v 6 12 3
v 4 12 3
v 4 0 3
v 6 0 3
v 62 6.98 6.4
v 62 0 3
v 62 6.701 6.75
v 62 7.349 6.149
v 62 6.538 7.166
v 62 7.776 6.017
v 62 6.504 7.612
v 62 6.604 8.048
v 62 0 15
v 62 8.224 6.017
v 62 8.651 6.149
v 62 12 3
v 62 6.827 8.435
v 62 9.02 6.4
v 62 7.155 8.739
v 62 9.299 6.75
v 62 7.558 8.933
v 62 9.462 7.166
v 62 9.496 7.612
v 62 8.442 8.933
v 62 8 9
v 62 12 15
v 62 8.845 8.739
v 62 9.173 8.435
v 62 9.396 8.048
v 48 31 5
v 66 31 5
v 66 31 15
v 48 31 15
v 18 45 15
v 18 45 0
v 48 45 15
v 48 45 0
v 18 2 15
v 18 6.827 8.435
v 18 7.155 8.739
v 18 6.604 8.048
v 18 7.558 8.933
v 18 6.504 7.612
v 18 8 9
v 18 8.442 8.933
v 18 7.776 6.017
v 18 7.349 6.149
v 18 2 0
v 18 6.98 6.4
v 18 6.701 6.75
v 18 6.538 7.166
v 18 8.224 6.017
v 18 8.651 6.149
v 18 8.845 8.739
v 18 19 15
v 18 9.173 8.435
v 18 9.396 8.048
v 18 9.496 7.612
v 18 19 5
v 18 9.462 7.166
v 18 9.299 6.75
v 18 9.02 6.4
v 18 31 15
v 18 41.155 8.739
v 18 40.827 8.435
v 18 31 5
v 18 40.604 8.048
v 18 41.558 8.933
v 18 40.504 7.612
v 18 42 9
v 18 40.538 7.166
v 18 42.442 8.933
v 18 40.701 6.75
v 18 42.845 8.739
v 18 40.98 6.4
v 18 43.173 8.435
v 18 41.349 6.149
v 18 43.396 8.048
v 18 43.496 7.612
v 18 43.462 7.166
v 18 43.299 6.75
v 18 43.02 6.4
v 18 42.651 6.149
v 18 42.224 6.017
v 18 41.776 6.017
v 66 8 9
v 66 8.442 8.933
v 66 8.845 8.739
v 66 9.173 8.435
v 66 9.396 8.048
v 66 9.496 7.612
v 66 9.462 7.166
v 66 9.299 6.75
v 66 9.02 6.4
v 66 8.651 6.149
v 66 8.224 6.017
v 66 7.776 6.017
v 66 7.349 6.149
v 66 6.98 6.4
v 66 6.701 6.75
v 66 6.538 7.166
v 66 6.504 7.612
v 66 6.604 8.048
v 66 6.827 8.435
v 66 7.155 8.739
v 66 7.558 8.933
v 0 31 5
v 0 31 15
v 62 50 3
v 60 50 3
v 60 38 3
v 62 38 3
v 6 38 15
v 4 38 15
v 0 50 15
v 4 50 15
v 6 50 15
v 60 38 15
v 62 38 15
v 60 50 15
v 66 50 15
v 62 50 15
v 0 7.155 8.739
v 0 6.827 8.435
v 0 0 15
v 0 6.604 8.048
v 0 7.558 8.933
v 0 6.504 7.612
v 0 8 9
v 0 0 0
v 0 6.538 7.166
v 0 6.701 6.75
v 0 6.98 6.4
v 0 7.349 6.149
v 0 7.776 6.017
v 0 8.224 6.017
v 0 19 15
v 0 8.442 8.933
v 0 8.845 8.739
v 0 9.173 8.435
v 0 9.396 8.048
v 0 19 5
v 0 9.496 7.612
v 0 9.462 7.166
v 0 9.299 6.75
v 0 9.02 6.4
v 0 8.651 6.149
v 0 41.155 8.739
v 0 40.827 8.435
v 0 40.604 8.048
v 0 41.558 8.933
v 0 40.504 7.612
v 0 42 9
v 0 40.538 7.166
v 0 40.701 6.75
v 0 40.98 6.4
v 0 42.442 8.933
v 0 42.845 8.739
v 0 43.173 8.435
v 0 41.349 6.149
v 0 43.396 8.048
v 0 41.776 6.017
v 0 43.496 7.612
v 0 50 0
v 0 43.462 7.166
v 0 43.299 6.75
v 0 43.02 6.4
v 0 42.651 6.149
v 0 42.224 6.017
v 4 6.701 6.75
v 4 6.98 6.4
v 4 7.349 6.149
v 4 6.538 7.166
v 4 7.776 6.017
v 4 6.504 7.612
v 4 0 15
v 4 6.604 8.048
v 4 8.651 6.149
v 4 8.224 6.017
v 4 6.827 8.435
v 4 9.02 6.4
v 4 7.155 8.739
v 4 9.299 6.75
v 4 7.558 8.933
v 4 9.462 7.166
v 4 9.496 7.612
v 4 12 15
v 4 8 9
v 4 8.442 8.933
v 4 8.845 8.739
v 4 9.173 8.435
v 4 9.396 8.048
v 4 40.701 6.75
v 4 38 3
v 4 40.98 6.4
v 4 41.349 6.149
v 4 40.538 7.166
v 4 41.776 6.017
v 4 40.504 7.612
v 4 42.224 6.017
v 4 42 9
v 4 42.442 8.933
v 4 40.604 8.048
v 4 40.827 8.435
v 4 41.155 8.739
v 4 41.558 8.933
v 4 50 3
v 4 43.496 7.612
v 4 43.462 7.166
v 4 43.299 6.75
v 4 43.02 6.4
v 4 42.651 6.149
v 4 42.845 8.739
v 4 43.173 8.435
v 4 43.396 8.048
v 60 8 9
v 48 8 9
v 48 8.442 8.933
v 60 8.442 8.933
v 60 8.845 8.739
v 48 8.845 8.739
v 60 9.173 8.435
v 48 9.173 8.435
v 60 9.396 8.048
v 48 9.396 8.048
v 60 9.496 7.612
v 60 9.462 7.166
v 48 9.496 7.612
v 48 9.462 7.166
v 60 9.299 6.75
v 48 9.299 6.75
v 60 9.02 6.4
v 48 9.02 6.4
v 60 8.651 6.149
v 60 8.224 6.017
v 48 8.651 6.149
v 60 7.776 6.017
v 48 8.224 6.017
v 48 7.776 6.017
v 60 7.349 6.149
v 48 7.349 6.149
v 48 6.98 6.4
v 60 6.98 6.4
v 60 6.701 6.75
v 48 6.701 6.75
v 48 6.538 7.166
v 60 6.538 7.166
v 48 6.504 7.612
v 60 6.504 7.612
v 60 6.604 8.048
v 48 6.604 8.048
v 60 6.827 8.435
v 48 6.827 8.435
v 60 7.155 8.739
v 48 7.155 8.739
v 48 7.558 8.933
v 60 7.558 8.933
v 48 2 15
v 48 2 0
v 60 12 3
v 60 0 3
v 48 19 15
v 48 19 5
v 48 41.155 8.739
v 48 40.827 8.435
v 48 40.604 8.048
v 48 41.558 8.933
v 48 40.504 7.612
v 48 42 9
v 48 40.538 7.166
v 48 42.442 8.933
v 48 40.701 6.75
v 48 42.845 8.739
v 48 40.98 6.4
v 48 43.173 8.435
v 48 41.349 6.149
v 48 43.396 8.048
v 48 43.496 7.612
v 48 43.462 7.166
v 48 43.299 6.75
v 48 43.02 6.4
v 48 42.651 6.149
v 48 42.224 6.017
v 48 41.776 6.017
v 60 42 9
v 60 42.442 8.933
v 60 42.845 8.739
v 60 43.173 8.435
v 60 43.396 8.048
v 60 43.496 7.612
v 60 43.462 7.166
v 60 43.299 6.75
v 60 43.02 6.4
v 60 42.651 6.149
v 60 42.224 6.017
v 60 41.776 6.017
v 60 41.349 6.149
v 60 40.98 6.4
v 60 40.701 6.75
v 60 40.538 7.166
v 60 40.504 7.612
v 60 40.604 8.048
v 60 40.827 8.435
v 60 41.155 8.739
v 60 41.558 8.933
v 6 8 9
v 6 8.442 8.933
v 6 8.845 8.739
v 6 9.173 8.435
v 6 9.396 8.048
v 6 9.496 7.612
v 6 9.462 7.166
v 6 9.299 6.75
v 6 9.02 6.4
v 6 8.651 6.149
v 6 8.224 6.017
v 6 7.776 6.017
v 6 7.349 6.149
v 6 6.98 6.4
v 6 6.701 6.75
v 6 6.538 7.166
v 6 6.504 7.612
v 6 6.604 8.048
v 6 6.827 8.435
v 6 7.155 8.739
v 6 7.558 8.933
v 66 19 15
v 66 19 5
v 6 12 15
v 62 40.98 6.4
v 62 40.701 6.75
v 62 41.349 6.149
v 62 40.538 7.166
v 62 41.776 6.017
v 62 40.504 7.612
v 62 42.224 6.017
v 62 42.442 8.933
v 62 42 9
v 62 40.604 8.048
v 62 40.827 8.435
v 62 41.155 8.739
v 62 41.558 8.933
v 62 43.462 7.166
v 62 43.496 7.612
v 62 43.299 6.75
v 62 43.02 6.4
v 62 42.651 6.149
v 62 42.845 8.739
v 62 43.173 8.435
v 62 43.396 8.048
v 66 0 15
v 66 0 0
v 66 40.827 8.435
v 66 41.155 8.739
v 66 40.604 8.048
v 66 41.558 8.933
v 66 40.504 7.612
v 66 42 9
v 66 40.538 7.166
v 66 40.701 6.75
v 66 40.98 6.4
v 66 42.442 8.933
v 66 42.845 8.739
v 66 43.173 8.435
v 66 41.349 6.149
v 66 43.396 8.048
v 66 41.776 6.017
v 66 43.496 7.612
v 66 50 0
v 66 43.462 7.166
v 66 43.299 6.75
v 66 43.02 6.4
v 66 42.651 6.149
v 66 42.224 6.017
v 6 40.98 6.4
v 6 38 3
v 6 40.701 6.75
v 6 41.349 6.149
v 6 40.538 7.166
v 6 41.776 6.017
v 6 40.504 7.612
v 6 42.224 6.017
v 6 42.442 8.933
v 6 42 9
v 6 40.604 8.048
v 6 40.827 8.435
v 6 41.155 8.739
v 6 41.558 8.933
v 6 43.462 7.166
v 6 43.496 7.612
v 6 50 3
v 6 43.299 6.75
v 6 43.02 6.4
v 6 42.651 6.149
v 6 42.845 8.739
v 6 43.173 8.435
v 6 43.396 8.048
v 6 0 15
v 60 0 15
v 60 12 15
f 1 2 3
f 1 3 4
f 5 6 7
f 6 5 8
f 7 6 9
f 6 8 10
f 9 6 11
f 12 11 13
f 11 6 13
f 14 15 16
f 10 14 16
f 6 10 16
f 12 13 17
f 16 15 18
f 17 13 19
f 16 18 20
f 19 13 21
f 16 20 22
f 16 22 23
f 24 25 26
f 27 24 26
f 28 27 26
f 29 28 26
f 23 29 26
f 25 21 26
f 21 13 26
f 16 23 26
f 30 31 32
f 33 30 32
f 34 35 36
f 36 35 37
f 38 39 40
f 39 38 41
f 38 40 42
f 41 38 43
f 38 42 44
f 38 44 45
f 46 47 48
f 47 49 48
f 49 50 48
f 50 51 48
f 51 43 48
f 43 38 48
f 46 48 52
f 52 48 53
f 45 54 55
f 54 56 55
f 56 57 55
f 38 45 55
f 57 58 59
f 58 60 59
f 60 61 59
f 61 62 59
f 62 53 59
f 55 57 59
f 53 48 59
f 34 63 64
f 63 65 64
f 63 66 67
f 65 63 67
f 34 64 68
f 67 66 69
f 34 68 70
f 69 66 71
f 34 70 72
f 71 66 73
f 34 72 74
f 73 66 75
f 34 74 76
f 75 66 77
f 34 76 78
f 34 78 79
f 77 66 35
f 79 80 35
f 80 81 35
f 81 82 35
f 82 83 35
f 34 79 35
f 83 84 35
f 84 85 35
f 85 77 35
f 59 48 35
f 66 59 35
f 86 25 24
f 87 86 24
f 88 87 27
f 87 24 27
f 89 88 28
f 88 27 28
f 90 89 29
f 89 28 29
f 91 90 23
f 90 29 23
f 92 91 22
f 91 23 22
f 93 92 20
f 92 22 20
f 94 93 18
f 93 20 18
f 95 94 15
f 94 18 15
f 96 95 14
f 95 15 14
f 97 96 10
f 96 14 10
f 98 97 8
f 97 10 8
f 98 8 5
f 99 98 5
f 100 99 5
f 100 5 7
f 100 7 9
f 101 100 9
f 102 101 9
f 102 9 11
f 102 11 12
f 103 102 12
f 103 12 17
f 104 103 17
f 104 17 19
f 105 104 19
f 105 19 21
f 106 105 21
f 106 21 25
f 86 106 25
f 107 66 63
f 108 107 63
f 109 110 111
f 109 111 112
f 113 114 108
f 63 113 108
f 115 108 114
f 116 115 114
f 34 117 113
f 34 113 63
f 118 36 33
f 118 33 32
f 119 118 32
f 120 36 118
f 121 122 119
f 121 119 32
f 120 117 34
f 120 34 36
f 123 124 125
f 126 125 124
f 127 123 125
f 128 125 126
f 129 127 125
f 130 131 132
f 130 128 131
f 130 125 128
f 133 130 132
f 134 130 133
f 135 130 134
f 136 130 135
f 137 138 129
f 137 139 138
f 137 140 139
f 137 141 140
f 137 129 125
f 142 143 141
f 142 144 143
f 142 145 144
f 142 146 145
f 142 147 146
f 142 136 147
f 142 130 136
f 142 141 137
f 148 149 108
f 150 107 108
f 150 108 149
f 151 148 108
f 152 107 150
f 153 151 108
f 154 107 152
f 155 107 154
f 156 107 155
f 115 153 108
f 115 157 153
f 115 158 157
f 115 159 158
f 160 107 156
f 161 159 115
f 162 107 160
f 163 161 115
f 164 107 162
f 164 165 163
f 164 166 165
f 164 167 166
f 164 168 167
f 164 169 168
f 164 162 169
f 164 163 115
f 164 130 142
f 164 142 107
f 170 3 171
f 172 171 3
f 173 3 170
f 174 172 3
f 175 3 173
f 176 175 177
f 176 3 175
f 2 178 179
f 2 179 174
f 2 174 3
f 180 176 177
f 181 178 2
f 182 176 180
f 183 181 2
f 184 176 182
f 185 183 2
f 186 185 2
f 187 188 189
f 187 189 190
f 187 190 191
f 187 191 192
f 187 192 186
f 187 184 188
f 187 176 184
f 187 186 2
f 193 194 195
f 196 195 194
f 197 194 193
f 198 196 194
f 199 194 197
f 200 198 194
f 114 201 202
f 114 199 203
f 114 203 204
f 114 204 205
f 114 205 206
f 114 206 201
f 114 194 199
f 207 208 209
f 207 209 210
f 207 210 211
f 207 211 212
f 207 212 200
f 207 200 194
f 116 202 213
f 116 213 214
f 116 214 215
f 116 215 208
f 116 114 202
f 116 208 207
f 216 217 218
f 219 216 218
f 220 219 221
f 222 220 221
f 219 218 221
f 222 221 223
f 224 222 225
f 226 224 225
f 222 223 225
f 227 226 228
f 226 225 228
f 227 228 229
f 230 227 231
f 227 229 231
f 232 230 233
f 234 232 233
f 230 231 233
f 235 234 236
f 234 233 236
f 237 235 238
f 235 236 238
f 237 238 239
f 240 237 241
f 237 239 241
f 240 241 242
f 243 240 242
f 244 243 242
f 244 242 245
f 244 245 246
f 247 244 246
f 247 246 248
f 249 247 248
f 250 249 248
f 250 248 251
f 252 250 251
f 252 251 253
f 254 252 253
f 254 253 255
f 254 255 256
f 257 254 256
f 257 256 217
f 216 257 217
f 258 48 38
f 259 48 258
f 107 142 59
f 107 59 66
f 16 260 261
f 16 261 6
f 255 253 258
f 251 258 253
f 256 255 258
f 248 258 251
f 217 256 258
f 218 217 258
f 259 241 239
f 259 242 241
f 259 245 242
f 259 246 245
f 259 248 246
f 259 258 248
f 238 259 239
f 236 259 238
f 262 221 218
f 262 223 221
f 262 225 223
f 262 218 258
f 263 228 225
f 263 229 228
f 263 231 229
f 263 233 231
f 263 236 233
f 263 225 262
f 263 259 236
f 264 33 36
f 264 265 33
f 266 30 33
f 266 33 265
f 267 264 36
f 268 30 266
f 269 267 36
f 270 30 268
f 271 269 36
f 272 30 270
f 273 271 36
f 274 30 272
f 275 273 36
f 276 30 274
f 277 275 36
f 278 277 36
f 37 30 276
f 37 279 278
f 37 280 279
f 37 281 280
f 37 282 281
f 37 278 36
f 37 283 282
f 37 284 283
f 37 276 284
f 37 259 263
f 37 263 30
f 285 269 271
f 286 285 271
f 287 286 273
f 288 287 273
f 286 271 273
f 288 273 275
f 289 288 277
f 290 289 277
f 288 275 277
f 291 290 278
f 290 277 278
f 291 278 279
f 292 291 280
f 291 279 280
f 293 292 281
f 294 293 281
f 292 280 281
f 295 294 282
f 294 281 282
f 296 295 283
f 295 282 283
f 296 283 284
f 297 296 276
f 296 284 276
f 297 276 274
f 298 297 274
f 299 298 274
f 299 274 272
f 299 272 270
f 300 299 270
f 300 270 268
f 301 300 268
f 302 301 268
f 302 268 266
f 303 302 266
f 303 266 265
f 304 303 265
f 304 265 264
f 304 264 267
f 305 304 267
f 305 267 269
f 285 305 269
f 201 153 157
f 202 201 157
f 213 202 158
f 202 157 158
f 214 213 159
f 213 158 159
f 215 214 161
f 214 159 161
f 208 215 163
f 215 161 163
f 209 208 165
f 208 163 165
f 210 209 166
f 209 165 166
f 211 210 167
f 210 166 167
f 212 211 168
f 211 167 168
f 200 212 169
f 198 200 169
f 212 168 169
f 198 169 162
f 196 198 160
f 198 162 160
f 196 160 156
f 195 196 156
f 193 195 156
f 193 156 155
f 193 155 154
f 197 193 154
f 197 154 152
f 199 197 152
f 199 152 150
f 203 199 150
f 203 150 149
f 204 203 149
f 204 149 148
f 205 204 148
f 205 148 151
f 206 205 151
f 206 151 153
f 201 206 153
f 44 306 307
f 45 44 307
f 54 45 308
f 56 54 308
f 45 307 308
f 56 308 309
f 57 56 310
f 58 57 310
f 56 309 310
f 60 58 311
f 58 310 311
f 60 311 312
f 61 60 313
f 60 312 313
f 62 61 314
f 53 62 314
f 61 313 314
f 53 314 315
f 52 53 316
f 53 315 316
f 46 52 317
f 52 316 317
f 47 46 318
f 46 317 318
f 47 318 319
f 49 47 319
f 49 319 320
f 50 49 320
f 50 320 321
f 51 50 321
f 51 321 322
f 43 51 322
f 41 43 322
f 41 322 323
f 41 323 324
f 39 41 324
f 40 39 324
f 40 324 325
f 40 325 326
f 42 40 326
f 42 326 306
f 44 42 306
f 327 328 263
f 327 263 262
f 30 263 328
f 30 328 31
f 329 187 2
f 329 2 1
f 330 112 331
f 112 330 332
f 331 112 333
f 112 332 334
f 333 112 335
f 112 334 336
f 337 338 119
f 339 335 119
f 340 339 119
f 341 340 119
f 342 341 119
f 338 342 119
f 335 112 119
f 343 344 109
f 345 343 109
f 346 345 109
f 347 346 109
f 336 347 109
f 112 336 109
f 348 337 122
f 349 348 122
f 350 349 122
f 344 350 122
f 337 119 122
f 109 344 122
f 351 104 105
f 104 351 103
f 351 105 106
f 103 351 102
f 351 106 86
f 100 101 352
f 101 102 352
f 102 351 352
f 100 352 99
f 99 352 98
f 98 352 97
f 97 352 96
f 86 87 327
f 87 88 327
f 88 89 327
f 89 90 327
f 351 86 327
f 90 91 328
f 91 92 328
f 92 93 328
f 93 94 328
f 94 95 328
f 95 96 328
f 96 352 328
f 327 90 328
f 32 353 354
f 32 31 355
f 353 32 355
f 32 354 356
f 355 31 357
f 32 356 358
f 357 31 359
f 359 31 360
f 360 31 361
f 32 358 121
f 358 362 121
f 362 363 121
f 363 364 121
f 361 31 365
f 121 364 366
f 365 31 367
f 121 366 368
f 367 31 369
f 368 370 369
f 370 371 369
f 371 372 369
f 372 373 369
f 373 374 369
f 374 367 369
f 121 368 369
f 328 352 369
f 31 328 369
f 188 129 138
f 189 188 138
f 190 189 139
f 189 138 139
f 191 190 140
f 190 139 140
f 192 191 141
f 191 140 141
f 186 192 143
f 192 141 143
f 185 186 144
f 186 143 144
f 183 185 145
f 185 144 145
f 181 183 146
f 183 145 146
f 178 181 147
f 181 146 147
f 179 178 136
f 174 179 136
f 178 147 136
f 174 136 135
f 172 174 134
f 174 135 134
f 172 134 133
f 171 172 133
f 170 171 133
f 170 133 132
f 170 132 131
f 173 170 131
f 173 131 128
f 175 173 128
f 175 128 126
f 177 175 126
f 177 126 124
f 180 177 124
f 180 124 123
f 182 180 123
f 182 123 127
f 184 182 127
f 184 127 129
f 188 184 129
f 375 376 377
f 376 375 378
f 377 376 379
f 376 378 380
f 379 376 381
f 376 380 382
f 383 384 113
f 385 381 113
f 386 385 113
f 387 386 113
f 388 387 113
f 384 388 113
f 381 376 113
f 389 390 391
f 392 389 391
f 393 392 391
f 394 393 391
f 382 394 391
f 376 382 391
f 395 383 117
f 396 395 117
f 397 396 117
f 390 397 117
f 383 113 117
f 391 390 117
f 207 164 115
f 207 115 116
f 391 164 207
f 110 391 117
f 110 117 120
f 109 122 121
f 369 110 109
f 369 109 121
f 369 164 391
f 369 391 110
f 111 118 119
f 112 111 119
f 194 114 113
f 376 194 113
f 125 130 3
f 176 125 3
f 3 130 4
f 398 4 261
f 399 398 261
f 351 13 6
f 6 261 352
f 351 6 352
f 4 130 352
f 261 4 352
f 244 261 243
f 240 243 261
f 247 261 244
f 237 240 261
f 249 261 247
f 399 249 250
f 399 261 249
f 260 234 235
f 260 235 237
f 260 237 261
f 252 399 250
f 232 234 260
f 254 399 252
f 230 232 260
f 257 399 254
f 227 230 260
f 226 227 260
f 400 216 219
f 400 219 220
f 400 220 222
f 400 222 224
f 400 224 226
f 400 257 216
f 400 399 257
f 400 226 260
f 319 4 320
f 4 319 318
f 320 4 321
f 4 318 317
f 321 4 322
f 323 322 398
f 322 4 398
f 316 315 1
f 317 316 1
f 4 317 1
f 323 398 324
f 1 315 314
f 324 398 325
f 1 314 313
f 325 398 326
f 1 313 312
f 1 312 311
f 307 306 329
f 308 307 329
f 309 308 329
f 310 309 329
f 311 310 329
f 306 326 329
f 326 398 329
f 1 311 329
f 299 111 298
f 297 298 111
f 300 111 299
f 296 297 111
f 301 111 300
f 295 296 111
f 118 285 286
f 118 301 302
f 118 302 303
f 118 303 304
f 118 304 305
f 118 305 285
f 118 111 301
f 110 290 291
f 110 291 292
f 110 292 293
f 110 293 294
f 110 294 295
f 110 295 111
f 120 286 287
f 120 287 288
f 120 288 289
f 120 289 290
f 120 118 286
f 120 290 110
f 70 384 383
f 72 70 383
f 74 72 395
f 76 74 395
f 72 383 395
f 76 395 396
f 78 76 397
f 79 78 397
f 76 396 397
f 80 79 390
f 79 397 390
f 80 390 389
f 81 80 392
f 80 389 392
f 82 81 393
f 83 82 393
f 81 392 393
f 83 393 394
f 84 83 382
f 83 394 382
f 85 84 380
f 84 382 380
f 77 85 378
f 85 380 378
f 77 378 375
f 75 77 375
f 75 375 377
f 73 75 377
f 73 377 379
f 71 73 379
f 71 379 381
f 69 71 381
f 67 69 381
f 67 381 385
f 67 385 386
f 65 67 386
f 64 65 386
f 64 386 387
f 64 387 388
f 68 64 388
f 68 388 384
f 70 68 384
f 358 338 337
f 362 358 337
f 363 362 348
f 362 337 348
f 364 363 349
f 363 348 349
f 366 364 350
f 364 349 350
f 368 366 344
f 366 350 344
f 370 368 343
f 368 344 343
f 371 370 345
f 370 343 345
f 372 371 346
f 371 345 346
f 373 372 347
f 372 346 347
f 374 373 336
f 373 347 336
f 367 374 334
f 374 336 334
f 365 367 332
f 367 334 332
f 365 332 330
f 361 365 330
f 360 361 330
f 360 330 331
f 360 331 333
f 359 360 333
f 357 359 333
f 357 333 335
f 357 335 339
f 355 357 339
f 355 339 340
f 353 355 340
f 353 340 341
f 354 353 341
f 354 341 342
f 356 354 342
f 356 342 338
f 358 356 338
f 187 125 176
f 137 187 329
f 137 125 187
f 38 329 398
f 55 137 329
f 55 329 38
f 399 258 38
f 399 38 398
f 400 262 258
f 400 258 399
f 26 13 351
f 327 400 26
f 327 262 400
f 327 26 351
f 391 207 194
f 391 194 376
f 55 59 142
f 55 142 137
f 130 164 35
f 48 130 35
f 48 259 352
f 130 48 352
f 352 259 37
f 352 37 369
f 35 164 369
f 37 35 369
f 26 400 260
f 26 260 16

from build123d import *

# Parameters (mm, degrees)
CROQUIS1_W              = 66
CROQUIS1_H              = 50
CROQUIS1_W_2            = 30
CROQUIS1_H_2            = 43
SALIENTE_EXTRUIR1_DEPTH = 15
CROQUIS2_R              = 1.5
CROQUIS2_W              = 10
CROQUIS2_H              = 12
CORTAR_EXTRUIR1_DEPTH   = 67
CROQUIS3_W              = 2
CROQUIS3_H              = 12
CORTAR_EXTRUIR2_DEPTH   = 12


with BuildPart() as part:
    # Croquis1 → Saliente-Extruir1 (new body)
    with BuildSketch(Plane.XY):
        with Locations((33, 25)):
            Rectangle(CROQUIS1_W, CROQUIS1_H)
        with Locations((33, 23.5)):
            Rectangle(CROQUIS1_W_2, CROQUIS1_H_2, mode=Mode.SUBTRACT)
    extrude(amount=SALIENTE_EXTRUIR1_DEPTH)

    # Croquis2 → Cortar-Extruir1 (cut, through all)
    with BuildSketch(Plane.ZY):
        with Locations((7.5, 42)):
            Circle(CROQUIS2_R)
        with Locations((7.5, 8)):
            Circle(CROQUIS2_R)
        with Locations((10, 25)):
            Rectangle(CROQUIS2_W, CROQUIS2_H)
    extrude(amount=-CORTAR_EXTRUIR1_DEPTH, mode=Mode.SUBTRACT)

    # Croquis3 → Cortar-Extruir2 (cut)
    with BuildSketch(Plane.XY.offset(15)):
        with Locations((5, 44)):
            Rectangle(CROQUIS3_W, CROQUIS3_H)
        with Locations((61, 44)):
            Rectangle(CROQUIS3_W, CROQUIS3_H)
        with Locations((5, 6)):
            Rectangle(CROQUIS3_W, CROQUIS3_H)
        with Locations((61, 6)):
            Rectangle(CROQUIS3_W, CROQUIS3_H)
    extrude(amount=-CORTAR_EXTRUIR2_DEPTH, mode=Mode.SUBTRACT)


solid = part.part
